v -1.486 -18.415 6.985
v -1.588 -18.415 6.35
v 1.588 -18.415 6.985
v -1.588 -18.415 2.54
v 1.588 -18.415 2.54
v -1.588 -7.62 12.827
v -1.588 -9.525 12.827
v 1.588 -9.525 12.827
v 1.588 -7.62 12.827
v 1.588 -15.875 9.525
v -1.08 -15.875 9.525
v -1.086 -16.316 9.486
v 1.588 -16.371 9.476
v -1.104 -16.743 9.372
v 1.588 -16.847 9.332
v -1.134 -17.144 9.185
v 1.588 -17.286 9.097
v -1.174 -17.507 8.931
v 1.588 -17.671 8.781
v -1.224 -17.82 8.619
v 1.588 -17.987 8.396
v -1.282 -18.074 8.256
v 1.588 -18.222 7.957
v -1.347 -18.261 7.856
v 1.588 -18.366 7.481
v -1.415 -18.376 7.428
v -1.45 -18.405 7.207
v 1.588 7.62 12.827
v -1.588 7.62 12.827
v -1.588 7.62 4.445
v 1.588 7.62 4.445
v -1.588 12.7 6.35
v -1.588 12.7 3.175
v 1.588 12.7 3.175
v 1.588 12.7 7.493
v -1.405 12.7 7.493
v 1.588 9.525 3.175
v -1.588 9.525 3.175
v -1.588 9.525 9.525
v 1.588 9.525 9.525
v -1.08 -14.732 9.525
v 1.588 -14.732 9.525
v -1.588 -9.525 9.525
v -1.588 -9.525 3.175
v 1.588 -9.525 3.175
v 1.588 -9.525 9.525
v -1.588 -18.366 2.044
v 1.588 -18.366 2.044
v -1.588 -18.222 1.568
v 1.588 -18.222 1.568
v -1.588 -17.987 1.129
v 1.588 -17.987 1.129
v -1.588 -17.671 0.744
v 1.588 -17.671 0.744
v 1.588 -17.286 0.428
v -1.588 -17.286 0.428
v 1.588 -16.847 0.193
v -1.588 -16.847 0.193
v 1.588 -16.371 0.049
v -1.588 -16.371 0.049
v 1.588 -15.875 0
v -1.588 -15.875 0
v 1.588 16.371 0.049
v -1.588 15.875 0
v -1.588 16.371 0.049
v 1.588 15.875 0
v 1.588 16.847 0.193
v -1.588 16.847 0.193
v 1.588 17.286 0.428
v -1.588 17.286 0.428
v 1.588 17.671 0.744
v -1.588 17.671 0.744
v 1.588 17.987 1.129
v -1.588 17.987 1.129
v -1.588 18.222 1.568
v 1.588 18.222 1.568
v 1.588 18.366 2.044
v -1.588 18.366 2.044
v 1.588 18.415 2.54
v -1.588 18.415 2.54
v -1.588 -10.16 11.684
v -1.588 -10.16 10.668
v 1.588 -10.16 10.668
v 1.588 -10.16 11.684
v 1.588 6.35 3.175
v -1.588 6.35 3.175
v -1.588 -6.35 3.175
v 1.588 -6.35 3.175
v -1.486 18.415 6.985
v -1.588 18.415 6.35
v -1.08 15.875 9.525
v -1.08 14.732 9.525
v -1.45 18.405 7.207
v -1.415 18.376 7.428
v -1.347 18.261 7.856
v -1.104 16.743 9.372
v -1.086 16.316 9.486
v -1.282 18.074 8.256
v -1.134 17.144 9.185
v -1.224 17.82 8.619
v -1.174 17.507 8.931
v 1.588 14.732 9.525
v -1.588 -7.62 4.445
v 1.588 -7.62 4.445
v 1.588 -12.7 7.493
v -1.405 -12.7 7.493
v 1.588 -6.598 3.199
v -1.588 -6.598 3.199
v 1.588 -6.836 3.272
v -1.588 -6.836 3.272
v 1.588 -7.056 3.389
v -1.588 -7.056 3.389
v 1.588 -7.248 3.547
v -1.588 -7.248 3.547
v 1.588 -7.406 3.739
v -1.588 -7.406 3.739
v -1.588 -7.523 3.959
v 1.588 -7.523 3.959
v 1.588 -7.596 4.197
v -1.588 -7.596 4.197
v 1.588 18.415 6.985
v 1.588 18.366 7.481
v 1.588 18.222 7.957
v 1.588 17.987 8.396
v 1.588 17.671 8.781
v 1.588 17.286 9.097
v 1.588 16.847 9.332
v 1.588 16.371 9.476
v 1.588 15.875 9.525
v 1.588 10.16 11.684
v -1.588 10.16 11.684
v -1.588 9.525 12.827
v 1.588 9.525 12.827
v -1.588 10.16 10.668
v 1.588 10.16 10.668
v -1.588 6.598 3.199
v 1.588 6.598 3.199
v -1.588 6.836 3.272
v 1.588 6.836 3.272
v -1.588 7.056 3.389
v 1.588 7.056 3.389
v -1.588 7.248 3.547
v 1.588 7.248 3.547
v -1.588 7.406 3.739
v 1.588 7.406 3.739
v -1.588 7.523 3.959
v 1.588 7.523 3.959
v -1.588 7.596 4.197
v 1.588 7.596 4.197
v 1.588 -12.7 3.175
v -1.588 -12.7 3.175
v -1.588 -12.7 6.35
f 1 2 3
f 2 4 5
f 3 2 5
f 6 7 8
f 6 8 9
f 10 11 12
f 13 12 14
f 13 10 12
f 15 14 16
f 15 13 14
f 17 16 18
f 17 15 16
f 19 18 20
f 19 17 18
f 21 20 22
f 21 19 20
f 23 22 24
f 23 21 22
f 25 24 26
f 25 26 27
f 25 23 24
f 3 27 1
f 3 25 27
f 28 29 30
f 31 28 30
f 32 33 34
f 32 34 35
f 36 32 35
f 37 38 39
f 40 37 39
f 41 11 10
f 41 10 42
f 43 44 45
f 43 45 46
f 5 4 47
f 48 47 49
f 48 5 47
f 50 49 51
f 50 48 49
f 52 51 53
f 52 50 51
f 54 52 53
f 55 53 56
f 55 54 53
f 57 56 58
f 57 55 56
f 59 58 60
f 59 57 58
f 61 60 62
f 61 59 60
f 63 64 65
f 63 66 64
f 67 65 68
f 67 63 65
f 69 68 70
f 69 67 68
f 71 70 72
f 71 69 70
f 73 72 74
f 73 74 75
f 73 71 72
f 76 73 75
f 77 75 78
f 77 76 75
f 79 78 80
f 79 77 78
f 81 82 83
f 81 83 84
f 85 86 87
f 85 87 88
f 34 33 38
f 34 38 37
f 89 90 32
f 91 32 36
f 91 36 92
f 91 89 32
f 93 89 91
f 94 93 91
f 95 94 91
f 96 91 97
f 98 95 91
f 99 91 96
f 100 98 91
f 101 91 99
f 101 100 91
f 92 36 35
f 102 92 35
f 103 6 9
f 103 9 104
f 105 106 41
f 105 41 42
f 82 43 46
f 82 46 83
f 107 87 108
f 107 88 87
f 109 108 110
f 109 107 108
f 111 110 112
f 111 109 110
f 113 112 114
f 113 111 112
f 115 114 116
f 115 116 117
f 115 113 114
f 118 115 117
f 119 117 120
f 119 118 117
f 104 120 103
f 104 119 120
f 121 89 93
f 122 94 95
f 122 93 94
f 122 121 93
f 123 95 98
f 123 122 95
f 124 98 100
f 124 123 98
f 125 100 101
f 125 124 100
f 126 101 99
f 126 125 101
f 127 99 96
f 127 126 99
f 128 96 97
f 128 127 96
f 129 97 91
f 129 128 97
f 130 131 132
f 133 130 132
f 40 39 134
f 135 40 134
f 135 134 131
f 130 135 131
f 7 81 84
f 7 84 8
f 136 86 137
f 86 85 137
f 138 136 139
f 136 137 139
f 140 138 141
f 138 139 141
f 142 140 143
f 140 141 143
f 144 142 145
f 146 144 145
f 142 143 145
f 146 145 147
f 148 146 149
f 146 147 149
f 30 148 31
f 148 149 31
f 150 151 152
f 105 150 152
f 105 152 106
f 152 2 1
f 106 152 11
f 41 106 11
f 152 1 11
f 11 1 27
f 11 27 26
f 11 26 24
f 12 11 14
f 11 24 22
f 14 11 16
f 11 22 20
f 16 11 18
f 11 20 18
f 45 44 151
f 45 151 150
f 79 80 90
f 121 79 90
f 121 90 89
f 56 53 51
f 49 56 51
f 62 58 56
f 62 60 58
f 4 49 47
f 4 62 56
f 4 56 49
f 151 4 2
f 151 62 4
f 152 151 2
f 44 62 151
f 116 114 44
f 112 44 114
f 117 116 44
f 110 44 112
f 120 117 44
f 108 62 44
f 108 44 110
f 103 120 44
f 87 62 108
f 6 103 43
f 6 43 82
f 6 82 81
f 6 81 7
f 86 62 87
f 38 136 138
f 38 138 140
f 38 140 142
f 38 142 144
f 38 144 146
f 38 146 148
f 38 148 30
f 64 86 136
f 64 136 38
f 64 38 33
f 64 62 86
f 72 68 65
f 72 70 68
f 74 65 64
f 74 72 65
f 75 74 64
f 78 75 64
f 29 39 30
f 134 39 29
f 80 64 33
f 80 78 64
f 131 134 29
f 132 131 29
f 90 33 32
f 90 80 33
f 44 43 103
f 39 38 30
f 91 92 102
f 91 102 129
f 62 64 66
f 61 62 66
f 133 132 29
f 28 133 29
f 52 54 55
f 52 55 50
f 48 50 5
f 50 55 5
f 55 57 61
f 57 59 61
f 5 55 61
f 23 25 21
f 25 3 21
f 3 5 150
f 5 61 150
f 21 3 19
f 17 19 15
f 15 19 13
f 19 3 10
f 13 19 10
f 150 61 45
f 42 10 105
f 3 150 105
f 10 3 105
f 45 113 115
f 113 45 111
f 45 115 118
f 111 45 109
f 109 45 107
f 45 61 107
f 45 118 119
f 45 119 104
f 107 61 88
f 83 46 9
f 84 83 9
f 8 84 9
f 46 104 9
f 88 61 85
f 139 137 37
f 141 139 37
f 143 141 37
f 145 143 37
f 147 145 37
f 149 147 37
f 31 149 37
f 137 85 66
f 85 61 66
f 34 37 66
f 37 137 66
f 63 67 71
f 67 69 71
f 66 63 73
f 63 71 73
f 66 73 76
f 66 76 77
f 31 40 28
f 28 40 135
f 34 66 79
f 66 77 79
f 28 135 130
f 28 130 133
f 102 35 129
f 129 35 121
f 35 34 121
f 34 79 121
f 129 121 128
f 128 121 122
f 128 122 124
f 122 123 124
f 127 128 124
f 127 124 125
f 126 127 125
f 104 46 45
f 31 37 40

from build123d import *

# Parameters (mm, degrees)
SKETCH1_W          = 3.175
SKETCH1_H          = 36.83
BASE_DEPTH         = 3.175
SKETCH3_W          = 6.35
SKETCH3_H          = 5.715
RETAINER_DEPTH     = 3.175
TAB_DEPTH          = 3.175
FILLET1_R          = 1.27
FILLET2_R          = 2.54
CHAMFER1_SIZE      = 2.032
CUT_EXTRUDE1_REACH = 41.032


with BuildPart() as part:
    # Sketch1 → Base (new body)
    with BuildSketch(Plane.XY):
        Rectangle(SKETCH1_W, SKETCH1_H)
    extrude(amount=BASE_DEPTH)

    # Sketch3 → Retainer (add)
    with BuildSketch(Plane.ZY.offset(1.5875)):
        with Locations((6.35, 15.5575)):
            Rectangle(SKETCH3_W, SKETCH3_H)
        with Locations((6.35, -15.5575)):
            Rectangle(SKETCH3_W, SKETCH3_H)
    extrude(amount=-RETAINER_DEPTH)

    # Sketch5 → Tab (add)
    with BuildSketch(Plane.ZY.offset(1.5875)):
        Polygon((3.175, 9.525), (9.525, 9.525), (10.668, 10.16), (11.684, 10.16), (12.827, 9.525), (12.827, 7.62), (3.175, 7.62), align=None)
        Polygon((12.827, -7.62), (3.175, -7.62), (3.175, -9.525), (9.525, -9.525), (10.668, -10.16), (11.684, -10.16), (12.827, -9.525), align=None)
    extrude(amount=-TAB_DEPTH)

    # Fillet1
    fillet1_edges = [part.edges().sort_by_distance(p)[0] for p in [
        (0, 7.62, 3.175),
        (0, -7.62, 3.175),
    ]]
    fillet(fillet1_edges, radius=FILLET1_R)

    # Fillet2
    fillet2_edges = [part.edges().sort_by_distance(p)[0] for p in [
        (0, 18.415, 9.525),
        (0, -18.415, 9.525),
        (0, -18.415, 0),
        (0, 18.415, 0),
    ]]
    fillet(fillet2_edges, radius=FILLET2_R)

    # Chamfer1
    chamfer1_edges = [part.edges().sort_by_distance(p)[0] for p in [
        (0, 12.7, 9.525),
        (0, -12.7, 9.525),
    ]]
    chamfer(chamfer1_edges, length=CHAMFER1_SIZE)

    # Sketch6 → Cut-Extrude1 (cut, up to next)
    with BuildSketch(Plane(origin=(0, 18.415, 0), x_dir=(1, 0, 0), z_dir=(0, 1, 0)), mode=Mode.PRIVATE) as cut_extrude1_sk1:
        Polygon((-1.5875, -6.35), (-1.0795, -9.525), (-1.5875, -9.525), align=None)
    cut_extrude1_tool1 = extrude(cut_extrude1_sk1.sketch, amount=-CUT_EXTRUDE1_REACH, mode=Mode.PRIVATE) & part.part
    cut_extrude1 = cut_extrude1_tool1.solids().sort_by_distance((-1.418167, 18.415, 8.466667))[0]
    add(cut_extrude1, mode=Mode.SUBTRACT)

    # Mirror1: Cut-Extrude1 across plane
    add(cut_extrude1.mirror(Plane.ZX), mode=Mode.SUBTRACT)


solid = part.part
